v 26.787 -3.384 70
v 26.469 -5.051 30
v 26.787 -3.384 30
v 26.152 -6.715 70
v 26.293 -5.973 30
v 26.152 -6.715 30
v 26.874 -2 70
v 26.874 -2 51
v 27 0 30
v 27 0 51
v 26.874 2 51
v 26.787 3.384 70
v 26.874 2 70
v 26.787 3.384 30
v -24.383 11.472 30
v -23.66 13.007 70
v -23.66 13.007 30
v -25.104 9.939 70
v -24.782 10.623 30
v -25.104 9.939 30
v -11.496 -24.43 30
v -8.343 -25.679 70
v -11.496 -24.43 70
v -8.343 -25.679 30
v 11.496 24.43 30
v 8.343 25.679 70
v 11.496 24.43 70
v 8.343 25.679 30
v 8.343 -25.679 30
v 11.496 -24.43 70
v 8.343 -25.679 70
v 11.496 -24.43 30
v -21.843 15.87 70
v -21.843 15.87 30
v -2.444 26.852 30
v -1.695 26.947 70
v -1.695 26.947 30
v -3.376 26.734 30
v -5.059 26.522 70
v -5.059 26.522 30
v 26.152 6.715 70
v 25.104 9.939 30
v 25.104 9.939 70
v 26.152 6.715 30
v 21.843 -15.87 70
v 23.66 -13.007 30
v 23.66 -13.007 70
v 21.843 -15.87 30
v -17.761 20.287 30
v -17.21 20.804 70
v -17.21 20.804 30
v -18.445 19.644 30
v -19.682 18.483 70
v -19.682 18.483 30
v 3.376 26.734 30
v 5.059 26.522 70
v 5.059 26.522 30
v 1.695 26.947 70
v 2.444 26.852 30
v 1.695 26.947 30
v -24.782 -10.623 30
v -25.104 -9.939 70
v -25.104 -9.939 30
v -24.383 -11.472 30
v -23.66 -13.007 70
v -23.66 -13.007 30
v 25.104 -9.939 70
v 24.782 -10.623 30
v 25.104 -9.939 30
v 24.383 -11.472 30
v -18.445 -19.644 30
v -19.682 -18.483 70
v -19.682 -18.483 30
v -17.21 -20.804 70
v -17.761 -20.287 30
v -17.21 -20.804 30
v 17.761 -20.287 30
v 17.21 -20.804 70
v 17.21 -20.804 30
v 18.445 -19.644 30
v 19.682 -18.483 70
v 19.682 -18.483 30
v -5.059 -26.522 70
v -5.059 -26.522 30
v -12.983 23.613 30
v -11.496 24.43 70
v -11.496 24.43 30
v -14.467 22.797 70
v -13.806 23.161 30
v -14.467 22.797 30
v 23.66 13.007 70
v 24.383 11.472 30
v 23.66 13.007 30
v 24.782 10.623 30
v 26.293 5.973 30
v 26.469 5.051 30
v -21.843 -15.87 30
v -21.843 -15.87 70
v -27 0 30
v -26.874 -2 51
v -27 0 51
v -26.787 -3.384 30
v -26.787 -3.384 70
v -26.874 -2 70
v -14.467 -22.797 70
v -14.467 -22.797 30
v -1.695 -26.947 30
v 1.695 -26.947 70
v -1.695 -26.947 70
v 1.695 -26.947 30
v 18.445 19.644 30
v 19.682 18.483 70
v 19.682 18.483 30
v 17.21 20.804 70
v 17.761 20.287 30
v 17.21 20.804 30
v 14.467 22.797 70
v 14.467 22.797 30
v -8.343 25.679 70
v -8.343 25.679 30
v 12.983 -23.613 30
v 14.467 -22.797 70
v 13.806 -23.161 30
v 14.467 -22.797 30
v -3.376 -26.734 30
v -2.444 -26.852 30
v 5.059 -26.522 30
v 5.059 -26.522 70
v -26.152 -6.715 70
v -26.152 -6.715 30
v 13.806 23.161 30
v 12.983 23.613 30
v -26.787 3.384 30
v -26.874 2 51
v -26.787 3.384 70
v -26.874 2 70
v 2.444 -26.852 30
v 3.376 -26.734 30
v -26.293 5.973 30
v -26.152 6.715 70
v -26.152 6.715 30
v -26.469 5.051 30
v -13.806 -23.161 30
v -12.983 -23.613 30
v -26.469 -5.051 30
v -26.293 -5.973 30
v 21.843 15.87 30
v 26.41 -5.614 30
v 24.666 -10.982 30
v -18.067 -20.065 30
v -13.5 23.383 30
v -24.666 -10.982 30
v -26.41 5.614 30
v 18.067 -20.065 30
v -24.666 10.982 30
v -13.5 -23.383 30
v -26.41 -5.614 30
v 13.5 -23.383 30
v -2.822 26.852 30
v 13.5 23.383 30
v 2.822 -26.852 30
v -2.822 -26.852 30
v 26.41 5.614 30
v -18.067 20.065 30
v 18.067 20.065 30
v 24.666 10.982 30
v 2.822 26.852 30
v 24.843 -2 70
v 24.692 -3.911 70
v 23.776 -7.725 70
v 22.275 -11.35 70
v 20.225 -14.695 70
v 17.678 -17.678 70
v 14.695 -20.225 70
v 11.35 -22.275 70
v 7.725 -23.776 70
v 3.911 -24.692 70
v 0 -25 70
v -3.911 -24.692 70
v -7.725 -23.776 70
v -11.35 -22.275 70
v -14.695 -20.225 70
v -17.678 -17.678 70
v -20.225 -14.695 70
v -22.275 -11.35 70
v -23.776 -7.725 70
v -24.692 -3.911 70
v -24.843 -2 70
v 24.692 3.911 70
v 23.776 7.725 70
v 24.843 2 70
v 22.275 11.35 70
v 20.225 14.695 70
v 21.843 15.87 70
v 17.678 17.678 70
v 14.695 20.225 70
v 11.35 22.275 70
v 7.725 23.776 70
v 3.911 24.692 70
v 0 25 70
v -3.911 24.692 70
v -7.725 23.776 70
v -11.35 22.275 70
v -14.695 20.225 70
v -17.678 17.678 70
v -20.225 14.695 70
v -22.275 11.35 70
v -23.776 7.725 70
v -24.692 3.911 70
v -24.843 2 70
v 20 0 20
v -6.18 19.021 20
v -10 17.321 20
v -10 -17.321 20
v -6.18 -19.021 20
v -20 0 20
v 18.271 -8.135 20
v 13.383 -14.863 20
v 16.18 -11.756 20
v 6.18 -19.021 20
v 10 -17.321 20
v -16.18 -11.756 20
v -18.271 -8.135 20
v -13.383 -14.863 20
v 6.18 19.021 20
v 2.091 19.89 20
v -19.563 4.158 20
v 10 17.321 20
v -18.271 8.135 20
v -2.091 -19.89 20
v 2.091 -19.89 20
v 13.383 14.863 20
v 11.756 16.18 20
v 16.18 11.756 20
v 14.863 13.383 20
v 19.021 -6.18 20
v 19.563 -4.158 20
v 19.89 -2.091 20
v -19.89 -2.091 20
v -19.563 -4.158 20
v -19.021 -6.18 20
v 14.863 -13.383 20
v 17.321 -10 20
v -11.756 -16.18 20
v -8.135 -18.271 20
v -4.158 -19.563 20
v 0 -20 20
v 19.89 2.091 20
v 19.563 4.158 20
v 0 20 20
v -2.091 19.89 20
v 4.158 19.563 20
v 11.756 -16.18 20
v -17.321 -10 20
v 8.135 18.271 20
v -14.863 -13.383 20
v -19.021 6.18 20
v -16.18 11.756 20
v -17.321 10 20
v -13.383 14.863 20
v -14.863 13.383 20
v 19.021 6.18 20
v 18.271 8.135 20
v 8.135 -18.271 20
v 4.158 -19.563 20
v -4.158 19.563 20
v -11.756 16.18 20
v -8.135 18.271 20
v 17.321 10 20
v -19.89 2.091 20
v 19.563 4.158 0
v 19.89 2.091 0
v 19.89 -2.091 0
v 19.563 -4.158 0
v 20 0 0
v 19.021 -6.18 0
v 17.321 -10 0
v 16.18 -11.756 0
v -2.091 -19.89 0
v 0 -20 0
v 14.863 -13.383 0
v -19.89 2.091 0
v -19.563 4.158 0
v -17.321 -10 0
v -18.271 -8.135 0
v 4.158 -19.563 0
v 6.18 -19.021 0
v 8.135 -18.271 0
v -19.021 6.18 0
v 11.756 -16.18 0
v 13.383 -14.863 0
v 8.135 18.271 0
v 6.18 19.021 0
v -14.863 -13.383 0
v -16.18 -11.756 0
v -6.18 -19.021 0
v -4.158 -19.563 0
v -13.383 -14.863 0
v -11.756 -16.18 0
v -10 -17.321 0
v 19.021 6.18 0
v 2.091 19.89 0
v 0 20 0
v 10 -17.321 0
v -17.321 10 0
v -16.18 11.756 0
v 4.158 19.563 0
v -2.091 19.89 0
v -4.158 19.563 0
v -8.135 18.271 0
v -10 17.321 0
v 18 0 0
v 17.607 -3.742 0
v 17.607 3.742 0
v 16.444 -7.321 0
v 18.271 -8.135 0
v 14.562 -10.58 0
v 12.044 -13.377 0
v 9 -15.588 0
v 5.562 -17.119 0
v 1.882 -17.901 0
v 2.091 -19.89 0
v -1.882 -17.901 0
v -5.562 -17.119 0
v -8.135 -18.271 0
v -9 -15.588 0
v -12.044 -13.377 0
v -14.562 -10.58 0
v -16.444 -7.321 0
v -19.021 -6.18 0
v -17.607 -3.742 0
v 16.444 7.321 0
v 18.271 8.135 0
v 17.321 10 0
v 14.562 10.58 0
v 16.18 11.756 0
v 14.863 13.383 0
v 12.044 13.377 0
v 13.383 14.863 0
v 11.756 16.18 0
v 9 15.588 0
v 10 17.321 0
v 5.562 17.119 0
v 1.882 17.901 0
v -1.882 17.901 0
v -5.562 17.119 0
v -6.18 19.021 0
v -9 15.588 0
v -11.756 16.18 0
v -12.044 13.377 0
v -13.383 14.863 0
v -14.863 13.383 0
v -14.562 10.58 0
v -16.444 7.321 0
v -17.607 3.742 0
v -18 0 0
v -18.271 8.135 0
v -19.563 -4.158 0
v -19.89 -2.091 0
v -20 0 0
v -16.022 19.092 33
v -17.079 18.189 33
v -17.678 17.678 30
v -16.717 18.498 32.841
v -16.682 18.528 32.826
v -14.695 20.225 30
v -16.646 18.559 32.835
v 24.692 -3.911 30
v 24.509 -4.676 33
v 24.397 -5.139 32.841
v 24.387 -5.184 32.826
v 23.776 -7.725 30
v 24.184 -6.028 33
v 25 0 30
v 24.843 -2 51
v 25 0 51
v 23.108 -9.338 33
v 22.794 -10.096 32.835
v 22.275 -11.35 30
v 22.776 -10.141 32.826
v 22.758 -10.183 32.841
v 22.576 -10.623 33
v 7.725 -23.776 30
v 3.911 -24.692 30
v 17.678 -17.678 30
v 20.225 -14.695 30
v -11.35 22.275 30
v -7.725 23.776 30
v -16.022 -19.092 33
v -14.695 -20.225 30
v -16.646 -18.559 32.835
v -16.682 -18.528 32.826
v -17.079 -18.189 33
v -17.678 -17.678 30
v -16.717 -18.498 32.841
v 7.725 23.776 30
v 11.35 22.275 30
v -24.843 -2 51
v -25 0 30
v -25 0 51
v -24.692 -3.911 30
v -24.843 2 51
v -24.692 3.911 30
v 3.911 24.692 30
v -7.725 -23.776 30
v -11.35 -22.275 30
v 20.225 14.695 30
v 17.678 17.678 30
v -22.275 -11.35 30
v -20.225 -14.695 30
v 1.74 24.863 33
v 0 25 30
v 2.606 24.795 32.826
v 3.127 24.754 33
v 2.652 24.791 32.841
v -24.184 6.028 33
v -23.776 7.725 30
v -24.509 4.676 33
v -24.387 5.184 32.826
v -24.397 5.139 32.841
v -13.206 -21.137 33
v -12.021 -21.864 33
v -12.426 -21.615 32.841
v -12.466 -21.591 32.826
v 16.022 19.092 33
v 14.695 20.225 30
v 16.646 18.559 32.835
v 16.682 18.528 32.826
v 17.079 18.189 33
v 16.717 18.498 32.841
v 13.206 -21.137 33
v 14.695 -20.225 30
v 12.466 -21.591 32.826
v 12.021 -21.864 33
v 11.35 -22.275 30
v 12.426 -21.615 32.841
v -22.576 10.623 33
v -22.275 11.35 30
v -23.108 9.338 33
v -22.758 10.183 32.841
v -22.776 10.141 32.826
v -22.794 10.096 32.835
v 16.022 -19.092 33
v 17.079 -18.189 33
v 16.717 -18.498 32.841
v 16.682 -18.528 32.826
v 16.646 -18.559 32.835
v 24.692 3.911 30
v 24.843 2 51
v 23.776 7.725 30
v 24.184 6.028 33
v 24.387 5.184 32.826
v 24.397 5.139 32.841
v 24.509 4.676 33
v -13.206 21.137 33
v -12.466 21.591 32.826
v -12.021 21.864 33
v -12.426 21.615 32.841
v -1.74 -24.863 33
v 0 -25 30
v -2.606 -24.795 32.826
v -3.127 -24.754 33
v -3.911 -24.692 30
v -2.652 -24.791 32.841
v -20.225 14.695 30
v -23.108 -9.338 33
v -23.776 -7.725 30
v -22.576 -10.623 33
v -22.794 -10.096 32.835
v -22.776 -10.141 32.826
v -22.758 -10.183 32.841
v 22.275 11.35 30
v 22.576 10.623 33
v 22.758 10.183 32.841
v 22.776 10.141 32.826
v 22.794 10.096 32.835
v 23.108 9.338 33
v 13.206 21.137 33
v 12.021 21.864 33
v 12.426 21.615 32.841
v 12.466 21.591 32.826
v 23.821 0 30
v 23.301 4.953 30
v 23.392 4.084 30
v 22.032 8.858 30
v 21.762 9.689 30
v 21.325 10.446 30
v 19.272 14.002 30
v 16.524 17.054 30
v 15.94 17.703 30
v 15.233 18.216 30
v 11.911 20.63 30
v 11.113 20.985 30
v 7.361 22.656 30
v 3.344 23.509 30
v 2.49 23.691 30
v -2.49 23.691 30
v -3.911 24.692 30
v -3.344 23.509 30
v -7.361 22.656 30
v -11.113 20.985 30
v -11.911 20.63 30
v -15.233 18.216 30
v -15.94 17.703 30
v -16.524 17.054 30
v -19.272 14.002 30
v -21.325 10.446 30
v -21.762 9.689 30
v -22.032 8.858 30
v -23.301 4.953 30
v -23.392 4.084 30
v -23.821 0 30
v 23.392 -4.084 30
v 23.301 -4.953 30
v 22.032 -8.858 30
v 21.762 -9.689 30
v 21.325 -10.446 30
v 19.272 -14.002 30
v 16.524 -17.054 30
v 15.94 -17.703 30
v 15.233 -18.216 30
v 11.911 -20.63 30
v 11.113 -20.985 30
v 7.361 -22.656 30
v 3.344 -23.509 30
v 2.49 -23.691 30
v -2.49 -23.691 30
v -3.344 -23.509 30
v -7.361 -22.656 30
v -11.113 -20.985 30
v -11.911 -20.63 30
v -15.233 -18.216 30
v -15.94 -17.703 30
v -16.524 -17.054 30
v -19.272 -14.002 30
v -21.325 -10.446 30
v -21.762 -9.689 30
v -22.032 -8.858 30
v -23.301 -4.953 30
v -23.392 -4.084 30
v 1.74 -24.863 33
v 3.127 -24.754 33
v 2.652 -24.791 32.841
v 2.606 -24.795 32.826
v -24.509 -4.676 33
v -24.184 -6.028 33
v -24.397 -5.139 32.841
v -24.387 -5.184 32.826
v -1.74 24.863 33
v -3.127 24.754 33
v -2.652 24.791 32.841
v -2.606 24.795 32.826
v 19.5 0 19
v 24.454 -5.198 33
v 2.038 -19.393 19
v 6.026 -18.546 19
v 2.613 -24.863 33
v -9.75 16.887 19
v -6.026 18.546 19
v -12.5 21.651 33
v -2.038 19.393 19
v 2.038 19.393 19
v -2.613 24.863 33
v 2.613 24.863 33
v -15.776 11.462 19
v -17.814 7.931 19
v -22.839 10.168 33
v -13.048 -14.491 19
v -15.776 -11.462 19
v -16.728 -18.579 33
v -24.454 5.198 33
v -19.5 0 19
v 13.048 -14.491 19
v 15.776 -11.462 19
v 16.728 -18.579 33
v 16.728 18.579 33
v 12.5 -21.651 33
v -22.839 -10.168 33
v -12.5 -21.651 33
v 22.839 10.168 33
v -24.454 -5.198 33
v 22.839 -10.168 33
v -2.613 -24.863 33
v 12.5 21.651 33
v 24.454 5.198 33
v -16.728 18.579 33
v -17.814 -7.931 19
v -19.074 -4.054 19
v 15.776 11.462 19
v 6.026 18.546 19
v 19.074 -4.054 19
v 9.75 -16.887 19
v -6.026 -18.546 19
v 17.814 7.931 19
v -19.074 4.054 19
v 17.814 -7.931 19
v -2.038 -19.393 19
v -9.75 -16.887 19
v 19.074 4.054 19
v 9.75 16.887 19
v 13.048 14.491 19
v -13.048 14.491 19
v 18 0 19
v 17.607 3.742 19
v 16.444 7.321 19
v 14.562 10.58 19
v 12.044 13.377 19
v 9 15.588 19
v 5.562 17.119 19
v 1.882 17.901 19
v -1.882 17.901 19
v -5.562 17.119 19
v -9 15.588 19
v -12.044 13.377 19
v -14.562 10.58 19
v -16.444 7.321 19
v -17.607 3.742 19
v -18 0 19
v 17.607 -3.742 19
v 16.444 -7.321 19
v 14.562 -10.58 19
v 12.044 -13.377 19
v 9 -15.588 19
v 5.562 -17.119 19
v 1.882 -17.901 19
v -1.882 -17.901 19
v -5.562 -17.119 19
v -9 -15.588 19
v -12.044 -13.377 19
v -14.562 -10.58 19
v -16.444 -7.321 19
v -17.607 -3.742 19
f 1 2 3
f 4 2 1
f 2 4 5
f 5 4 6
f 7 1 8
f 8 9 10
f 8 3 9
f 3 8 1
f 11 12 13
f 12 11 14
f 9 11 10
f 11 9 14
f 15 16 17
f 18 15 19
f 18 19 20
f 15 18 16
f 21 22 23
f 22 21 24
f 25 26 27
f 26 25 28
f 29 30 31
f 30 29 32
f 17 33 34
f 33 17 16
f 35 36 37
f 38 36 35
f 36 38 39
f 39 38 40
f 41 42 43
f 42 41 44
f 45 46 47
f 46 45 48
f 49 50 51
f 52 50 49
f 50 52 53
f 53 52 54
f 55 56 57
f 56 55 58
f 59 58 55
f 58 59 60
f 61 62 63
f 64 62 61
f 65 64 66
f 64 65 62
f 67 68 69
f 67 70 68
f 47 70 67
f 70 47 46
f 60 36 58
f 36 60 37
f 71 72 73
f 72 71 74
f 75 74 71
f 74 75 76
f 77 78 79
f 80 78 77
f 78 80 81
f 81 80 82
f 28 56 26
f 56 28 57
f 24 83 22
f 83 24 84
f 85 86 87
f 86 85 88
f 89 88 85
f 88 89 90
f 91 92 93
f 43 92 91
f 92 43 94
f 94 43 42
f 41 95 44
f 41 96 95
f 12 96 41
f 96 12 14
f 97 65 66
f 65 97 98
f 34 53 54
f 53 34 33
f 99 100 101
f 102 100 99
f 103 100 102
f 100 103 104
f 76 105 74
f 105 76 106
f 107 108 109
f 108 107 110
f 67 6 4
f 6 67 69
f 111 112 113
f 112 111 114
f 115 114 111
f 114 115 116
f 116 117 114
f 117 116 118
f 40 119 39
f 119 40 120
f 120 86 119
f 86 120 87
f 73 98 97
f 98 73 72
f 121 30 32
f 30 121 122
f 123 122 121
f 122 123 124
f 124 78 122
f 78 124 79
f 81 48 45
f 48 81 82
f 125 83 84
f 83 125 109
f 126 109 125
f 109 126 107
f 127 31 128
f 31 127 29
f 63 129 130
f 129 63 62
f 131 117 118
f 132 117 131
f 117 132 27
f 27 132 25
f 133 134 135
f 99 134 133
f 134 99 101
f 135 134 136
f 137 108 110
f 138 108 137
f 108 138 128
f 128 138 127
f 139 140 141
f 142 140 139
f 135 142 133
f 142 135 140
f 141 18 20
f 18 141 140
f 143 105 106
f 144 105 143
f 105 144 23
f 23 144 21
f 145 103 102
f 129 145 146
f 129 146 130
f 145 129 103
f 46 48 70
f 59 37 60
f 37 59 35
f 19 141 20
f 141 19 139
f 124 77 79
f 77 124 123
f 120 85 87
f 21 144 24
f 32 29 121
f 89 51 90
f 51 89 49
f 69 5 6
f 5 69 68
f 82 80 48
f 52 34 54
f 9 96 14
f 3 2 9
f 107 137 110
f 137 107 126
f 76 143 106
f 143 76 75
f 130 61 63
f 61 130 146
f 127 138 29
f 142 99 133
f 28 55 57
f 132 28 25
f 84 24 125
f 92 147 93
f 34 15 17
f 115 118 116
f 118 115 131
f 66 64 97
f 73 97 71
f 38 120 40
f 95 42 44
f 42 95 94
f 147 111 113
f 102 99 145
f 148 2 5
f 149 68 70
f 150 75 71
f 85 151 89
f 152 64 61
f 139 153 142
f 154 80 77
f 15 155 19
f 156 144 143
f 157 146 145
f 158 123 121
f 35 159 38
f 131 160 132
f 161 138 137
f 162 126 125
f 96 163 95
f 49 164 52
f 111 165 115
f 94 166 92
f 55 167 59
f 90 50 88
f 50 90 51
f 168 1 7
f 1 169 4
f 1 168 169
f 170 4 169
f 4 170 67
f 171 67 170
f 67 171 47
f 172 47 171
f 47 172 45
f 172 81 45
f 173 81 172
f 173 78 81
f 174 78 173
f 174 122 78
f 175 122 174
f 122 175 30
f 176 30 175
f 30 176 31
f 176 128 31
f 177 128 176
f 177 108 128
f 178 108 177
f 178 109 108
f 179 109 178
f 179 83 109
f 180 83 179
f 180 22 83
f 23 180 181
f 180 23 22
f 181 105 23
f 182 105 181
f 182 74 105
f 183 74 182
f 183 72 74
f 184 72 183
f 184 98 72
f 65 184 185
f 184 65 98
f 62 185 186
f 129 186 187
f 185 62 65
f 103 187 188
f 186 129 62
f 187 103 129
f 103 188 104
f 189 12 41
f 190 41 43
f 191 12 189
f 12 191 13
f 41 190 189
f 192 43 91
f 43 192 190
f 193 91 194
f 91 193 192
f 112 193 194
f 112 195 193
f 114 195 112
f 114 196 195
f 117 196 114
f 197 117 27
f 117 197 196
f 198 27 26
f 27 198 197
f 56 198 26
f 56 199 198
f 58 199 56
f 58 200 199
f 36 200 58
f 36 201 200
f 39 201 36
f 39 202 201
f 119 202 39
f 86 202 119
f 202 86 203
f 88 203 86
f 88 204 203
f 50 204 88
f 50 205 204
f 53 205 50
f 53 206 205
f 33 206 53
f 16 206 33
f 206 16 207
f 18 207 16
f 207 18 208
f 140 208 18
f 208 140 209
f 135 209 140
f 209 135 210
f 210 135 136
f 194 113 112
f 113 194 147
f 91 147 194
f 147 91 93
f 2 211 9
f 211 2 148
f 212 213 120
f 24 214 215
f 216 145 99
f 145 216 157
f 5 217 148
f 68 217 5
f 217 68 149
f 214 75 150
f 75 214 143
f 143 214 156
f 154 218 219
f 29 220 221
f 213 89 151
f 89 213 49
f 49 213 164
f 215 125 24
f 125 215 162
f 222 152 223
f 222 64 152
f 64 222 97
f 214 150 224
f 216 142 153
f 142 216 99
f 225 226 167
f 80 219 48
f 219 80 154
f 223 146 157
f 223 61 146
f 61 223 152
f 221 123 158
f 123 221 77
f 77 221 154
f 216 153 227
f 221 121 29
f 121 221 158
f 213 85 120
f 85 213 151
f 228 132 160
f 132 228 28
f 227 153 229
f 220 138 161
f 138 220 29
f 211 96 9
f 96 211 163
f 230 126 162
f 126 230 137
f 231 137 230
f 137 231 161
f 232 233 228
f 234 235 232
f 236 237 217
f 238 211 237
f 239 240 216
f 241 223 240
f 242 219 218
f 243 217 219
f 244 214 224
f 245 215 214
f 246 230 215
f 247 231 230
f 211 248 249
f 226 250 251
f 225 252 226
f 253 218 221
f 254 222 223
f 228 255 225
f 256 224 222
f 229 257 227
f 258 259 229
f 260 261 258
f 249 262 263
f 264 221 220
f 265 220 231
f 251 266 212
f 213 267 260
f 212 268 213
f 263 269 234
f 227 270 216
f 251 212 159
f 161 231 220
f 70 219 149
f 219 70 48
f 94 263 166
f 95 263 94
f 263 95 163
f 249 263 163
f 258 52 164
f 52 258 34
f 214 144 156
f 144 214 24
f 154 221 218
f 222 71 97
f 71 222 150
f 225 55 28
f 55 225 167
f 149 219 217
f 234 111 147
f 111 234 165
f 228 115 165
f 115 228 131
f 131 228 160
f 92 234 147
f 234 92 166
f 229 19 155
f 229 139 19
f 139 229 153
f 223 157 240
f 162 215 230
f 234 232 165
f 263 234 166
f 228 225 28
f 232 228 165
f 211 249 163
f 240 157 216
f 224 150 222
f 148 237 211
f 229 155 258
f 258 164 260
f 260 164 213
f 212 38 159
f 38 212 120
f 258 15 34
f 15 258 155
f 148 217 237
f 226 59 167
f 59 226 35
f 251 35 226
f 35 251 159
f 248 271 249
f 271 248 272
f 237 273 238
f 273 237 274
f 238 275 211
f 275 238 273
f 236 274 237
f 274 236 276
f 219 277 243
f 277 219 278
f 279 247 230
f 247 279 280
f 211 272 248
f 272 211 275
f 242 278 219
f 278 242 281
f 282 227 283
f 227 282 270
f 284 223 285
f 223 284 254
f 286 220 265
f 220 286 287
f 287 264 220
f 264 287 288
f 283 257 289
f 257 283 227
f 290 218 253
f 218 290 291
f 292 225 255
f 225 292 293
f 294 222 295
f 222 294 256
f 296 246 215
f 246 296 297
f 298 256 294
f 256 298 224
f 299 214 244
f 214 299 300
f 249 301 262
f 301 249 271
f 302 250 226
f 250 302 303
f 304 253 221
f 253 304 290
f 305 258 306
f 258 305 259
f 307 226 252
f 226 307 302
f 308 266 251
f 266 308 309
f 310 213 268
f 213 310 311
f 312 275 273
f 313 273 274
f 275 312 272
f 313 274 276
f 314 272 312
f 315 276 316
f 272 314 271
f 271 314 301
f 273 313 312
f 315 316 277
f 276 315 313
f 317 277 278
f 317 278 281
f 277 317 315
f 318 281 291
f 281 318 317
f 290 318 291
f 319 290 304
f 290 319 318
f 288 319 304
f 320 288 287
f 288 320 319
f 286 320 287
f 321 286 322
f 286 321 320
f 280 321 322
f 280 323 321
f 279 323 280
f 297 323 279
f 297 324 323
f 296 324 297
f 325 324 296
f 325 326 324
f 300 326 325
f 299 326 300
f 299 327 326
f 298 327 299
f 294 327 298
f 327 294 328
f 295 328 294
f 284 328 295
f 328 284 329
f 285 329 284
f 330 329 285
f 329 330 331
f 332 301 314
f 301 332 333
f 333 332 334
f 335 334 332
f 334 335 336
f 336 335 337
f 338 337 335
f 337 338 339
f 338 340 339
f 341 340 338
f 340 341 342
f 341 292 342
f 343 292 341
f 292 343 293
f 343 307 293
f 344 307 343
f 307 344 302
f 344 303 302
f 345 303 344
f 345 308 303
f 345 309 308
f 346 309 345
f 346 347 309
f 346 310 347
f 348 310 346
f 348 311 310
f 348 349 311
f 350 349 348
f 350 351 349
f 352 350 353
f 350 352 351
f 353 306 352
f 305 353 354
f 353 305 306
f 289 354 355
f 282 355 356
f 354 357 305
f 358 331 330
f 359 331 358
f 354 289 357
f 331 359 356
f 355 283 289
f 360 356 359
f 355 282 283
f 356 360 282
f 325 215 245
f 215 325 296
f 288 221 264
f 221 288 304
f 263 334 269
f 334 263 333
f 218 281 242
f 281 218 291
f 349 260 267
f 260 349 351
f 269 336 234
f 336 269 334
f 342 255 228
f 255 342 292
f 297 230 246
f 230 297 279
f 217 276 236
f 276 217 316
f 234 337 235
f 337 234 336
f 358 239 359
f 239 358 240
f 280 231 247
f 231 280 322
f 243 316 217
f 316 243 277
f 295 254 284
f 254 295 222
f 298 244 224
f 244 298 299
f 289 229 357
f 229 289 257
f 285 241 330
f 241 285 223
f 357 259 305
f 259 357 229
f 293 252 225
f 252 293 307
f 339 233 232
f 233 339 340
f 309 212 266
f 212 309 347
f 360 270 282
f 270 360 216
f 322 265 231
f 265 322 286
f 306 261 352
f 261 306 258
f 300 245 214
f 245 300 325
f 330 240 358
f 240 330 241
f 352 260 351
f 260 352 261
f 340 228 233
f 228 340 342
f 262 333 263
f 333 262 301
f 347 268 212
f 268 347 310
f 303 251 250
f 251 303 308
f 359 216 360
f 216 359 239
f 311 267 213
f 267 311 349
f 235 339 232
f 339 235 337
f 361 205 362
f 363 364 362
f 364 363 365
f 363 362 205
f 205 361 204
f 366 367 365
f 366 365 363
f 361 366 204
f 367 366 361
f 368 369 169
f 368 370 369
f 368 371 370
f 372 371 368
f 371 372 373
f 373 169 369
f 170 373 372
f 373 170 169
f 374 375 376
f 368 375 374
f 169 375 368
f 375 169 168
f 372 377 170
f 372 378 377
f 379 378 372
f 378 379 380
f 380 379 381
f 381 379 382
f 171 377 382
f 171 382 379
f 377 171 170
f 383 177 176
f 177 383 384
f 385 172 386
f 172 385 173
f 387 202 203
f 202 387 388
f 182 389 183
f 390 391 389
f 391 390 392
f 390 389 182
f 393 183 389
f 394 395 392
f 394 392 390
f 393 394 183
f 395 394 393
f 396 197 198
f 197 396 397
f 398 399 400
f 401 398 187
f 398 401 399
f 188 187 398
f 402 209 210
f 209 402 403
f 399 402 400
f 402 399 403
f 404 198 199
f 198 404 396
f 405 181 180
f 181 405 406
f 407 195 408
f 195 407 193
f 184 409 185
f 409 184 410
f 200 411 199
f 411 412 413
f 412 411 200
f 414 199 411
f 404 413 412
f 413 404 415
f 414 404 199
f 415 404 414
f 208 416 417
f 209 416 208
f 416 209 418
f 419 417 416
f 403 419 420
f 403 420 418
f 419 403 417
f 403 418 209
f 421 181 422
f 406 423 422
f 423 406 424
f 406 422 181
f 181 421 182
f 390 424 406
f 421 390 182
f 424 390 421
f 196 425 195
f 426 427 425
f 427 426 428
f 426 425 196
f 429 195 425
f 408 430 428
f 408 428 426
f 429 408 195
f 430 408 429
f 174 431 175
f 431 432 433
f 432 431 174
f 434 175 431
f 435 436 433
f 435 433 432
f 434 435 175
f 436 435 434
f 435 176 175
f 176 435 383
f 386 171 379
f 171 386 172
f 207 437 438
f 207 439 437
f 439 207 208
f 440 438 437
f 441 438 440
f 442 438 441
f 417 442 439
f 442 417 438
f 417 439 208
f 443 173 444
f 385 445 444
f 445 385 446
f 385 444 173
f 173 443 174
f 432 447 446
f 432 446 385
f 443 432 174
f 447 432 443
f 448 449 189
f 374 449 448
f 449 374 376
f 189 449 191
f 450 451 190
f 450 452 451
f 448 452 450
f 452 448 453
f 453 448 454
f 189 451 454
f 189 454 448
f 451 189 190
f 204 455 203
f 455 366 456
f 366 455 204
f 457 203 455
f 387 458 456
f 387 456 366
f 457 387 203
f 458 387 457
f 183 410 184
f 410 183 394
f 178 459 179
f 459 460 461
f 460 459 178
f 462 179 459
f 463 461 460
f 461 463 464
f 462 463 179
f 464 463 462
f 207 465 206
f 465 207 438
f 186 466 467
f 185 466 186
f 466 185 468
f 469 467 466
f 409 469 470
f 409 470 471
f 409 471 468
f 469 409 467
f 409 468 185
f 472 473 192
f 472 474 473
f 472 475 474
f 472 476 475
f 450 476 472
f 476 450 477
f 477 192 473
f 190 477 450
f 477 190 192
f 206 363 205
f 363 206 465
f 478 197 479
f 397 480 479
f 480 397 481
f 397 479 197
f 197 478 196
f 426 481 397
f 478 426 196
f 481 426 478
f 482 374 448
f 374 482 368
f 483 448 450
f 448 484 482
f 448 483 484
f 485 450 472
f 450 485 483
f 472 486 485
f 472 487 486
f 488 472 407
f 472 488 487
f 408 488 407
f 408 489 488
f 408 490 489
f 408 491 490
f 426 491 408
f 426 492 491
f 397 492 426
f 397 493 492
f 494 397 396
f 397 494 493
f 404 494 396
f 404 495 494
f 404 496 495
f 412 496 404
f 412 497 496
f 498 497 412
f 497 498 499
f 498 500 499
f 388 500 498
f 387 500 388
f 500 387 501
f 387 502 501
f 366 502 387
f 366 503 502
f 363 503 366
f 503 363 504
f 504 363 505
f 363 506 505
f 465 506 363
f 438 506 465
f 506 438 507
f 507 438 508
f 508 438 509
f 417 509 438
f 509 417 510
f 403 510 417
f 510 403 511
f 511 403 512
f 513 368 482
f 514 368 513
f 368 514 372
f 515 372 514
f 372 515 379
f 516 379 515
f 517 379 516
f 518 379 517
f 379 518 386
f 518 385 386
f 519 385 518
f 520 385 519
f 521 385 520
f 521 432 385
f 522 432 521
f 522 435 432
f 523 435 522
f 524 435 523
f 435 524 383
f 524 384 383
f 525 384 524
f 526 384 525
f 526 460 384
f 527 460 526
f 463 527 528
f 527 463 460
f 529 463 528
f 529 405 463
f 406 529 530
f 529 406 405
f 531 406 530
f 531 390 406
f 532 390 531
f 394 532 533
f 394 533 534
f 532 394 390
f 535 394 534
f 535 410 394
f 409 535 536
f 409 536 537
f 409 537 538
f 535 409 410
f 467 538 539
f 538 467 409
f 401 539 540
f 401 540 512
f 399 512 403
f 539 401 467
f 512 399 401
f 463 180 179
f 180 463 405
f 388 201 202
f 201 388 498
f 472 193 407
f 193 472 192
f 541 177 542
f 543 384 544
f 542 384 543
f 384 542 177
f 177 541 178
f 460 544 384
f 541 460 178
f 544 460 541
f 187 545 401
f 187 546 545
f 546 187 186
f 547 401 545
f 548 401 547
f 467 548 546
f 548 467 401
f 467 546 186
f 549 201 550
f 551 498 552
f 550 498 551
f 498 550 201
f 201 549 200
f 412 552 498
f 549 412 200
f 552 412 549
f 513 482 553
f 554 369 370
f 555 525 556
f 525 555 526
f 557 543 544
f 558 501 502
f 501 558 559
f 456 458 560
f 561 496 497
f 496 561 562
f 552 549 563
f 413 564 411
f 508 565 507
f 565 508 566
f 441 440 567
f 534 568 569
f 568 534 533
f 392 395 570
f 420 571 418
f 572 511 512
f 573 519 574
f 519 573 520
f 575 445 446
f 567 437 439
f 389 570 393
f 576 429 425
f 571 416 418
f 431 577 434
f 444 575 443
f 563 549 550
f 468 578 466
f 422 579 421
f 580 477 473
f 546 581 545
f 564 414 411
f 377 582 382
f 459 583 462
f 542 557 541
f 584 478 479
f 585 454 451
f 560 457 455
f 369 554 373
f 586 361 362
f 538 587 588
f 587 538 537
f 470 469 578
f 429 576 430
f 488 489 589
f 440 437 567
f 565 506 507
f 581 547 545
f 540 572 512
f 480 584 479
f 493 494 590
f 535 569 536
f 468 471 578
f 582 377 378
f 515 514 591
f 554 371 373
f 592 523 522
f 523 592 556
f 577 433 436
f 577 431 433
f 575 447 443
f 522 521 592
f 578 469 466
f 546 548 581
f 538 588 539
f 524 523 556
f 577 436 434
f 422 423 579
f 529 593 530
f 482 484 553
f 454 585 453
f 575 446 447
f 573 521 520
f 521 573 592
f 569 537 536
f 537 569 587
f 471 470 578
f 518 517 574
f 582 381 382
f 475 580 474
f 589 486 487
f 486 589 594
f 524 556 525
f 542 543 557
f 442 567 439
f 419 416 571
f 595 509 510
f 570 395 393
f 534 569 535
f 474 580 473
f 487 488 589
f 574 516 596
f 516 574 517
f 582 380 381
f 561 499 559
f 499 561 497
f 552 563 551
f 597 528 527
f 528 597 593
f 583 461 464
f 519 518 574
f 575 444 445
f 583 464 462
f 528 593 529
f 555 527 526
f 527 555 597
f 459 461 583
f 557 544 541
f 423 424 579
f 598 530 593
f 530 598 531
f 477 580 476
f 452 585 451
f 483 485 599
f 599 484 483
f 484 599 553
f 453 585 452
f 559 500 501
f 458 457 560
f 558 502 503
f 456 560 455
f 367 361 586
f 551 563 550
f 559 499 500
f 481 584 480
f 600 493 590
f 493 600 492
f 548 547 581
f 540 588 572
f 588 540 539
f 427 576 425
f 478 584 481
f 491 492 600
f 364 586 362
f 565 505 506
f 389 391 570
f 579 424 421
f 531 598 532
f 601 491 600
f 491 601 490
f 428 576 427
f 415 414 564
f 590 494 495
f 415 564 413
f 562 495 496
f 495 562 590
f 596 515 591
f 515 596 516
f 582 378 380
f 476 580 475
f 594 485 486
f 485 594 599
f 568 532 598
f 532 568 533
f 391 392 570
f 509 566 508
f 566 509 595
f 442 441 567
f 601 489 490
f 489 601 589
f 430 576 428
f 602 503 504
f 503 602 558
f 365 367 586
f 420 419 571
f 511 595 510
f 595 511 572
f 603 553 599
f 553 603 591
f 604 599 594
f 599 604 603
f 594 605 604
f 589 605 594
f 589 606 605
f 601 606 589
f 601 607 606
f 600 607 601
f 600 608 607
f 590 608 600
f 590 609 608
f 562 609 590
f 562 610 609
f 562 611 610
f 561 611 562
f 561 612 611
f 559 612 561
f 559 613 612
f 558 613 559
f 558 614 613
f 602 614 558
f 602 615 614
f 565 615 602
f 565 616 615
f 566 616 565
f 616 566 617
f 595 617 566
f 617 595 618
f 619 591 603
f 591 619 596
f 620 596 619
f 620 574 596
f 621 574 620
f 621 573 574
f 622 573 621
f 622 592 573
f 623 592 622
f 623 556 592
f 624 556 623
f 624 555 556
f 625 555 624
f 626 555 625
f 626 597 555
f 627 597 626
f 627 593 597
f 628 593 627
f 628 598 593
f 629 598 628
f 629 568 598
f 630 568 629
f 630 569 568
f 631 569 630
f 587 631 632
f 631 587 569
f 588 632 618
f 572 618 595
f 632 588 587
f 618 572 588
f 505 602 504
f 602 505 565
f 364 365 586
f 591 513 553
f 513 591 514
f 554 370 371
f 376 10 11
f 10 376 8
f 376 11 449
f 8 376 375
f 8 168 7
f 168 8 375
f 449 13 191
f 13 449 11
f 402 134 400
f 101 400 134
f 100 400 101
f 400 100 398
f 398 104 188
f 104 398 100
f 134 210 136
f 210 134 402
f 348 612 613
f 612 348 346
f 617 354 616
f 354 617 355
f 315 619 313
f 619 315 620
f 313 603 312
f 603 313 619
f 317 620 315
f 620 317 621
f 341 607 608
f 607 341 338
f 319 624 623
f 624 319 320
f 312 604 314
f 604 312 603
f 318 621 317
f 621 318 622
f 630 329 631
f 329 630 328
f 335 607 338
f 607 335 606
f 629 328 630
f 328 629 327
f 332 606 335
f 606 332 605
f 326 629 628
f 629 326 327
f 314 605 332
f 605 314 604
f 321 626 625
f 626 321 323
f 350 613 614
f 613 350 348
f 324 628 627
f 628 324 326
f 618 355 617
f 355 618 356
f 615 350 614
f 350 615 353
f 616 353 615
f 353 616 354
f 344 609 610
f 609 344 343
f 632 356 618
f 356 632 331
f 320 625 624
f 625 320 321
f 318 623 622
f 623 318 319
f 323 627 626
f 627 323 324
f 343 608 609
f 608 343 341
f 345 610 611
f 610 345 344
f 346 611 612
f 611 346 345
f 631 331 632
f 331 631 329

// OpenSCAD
scope_dia = 50;
insert_length = 40;
pipe_outside_diameter = 43;
pipe_inside_diameter = 40;

module scope_adapter(){
difference(){
union(){

//create main scope eye piece tube
cylinder(r=(scope_dia + 4)/2,h=insert_length,$fn=50);

//create taper between eye piece and spigot
translate([0,0,insert_length]) cylinder(r1=(scope_dia+4)/2,r2=pipe_inside_diameter/2,h=10);

//create spigot for gluing inside 40mm solvent weld waste pipe 
translate([0,0,insert_length+10]) cylinder(r=pipe_inside_diameter/2,h=20,$fn=60);
}

//create socket for scope eye piece
translate([0,0,-2]) cylinder(r=(scope_dia)/2,h=insert_length+2,$fn=40);

//hollow out taper section
translate([0,0,insert_length-3]) cylinder(r1=(scope_dia)/2,r2=(pipe_outside_diameter-4)/2,h=14);

//create a couple of cut out for a bit of give
translate([scope_dia/2-1,-2,-1]) cube([4,4,insert_length/2]);
translate([-scope_dia/2-3,-2,-1]) cube([4,4,insert_length/2]);

//create hole through top spigot
translate([0,0,insert_length+10]) cylinder(r=(pipe_inside_diameter-4)/2,h=25);
}
}

//generate model and flip upside down for easier printing
translate([0,0,insert_length+30]) rotate([180,0,0]) scope_adapter();
